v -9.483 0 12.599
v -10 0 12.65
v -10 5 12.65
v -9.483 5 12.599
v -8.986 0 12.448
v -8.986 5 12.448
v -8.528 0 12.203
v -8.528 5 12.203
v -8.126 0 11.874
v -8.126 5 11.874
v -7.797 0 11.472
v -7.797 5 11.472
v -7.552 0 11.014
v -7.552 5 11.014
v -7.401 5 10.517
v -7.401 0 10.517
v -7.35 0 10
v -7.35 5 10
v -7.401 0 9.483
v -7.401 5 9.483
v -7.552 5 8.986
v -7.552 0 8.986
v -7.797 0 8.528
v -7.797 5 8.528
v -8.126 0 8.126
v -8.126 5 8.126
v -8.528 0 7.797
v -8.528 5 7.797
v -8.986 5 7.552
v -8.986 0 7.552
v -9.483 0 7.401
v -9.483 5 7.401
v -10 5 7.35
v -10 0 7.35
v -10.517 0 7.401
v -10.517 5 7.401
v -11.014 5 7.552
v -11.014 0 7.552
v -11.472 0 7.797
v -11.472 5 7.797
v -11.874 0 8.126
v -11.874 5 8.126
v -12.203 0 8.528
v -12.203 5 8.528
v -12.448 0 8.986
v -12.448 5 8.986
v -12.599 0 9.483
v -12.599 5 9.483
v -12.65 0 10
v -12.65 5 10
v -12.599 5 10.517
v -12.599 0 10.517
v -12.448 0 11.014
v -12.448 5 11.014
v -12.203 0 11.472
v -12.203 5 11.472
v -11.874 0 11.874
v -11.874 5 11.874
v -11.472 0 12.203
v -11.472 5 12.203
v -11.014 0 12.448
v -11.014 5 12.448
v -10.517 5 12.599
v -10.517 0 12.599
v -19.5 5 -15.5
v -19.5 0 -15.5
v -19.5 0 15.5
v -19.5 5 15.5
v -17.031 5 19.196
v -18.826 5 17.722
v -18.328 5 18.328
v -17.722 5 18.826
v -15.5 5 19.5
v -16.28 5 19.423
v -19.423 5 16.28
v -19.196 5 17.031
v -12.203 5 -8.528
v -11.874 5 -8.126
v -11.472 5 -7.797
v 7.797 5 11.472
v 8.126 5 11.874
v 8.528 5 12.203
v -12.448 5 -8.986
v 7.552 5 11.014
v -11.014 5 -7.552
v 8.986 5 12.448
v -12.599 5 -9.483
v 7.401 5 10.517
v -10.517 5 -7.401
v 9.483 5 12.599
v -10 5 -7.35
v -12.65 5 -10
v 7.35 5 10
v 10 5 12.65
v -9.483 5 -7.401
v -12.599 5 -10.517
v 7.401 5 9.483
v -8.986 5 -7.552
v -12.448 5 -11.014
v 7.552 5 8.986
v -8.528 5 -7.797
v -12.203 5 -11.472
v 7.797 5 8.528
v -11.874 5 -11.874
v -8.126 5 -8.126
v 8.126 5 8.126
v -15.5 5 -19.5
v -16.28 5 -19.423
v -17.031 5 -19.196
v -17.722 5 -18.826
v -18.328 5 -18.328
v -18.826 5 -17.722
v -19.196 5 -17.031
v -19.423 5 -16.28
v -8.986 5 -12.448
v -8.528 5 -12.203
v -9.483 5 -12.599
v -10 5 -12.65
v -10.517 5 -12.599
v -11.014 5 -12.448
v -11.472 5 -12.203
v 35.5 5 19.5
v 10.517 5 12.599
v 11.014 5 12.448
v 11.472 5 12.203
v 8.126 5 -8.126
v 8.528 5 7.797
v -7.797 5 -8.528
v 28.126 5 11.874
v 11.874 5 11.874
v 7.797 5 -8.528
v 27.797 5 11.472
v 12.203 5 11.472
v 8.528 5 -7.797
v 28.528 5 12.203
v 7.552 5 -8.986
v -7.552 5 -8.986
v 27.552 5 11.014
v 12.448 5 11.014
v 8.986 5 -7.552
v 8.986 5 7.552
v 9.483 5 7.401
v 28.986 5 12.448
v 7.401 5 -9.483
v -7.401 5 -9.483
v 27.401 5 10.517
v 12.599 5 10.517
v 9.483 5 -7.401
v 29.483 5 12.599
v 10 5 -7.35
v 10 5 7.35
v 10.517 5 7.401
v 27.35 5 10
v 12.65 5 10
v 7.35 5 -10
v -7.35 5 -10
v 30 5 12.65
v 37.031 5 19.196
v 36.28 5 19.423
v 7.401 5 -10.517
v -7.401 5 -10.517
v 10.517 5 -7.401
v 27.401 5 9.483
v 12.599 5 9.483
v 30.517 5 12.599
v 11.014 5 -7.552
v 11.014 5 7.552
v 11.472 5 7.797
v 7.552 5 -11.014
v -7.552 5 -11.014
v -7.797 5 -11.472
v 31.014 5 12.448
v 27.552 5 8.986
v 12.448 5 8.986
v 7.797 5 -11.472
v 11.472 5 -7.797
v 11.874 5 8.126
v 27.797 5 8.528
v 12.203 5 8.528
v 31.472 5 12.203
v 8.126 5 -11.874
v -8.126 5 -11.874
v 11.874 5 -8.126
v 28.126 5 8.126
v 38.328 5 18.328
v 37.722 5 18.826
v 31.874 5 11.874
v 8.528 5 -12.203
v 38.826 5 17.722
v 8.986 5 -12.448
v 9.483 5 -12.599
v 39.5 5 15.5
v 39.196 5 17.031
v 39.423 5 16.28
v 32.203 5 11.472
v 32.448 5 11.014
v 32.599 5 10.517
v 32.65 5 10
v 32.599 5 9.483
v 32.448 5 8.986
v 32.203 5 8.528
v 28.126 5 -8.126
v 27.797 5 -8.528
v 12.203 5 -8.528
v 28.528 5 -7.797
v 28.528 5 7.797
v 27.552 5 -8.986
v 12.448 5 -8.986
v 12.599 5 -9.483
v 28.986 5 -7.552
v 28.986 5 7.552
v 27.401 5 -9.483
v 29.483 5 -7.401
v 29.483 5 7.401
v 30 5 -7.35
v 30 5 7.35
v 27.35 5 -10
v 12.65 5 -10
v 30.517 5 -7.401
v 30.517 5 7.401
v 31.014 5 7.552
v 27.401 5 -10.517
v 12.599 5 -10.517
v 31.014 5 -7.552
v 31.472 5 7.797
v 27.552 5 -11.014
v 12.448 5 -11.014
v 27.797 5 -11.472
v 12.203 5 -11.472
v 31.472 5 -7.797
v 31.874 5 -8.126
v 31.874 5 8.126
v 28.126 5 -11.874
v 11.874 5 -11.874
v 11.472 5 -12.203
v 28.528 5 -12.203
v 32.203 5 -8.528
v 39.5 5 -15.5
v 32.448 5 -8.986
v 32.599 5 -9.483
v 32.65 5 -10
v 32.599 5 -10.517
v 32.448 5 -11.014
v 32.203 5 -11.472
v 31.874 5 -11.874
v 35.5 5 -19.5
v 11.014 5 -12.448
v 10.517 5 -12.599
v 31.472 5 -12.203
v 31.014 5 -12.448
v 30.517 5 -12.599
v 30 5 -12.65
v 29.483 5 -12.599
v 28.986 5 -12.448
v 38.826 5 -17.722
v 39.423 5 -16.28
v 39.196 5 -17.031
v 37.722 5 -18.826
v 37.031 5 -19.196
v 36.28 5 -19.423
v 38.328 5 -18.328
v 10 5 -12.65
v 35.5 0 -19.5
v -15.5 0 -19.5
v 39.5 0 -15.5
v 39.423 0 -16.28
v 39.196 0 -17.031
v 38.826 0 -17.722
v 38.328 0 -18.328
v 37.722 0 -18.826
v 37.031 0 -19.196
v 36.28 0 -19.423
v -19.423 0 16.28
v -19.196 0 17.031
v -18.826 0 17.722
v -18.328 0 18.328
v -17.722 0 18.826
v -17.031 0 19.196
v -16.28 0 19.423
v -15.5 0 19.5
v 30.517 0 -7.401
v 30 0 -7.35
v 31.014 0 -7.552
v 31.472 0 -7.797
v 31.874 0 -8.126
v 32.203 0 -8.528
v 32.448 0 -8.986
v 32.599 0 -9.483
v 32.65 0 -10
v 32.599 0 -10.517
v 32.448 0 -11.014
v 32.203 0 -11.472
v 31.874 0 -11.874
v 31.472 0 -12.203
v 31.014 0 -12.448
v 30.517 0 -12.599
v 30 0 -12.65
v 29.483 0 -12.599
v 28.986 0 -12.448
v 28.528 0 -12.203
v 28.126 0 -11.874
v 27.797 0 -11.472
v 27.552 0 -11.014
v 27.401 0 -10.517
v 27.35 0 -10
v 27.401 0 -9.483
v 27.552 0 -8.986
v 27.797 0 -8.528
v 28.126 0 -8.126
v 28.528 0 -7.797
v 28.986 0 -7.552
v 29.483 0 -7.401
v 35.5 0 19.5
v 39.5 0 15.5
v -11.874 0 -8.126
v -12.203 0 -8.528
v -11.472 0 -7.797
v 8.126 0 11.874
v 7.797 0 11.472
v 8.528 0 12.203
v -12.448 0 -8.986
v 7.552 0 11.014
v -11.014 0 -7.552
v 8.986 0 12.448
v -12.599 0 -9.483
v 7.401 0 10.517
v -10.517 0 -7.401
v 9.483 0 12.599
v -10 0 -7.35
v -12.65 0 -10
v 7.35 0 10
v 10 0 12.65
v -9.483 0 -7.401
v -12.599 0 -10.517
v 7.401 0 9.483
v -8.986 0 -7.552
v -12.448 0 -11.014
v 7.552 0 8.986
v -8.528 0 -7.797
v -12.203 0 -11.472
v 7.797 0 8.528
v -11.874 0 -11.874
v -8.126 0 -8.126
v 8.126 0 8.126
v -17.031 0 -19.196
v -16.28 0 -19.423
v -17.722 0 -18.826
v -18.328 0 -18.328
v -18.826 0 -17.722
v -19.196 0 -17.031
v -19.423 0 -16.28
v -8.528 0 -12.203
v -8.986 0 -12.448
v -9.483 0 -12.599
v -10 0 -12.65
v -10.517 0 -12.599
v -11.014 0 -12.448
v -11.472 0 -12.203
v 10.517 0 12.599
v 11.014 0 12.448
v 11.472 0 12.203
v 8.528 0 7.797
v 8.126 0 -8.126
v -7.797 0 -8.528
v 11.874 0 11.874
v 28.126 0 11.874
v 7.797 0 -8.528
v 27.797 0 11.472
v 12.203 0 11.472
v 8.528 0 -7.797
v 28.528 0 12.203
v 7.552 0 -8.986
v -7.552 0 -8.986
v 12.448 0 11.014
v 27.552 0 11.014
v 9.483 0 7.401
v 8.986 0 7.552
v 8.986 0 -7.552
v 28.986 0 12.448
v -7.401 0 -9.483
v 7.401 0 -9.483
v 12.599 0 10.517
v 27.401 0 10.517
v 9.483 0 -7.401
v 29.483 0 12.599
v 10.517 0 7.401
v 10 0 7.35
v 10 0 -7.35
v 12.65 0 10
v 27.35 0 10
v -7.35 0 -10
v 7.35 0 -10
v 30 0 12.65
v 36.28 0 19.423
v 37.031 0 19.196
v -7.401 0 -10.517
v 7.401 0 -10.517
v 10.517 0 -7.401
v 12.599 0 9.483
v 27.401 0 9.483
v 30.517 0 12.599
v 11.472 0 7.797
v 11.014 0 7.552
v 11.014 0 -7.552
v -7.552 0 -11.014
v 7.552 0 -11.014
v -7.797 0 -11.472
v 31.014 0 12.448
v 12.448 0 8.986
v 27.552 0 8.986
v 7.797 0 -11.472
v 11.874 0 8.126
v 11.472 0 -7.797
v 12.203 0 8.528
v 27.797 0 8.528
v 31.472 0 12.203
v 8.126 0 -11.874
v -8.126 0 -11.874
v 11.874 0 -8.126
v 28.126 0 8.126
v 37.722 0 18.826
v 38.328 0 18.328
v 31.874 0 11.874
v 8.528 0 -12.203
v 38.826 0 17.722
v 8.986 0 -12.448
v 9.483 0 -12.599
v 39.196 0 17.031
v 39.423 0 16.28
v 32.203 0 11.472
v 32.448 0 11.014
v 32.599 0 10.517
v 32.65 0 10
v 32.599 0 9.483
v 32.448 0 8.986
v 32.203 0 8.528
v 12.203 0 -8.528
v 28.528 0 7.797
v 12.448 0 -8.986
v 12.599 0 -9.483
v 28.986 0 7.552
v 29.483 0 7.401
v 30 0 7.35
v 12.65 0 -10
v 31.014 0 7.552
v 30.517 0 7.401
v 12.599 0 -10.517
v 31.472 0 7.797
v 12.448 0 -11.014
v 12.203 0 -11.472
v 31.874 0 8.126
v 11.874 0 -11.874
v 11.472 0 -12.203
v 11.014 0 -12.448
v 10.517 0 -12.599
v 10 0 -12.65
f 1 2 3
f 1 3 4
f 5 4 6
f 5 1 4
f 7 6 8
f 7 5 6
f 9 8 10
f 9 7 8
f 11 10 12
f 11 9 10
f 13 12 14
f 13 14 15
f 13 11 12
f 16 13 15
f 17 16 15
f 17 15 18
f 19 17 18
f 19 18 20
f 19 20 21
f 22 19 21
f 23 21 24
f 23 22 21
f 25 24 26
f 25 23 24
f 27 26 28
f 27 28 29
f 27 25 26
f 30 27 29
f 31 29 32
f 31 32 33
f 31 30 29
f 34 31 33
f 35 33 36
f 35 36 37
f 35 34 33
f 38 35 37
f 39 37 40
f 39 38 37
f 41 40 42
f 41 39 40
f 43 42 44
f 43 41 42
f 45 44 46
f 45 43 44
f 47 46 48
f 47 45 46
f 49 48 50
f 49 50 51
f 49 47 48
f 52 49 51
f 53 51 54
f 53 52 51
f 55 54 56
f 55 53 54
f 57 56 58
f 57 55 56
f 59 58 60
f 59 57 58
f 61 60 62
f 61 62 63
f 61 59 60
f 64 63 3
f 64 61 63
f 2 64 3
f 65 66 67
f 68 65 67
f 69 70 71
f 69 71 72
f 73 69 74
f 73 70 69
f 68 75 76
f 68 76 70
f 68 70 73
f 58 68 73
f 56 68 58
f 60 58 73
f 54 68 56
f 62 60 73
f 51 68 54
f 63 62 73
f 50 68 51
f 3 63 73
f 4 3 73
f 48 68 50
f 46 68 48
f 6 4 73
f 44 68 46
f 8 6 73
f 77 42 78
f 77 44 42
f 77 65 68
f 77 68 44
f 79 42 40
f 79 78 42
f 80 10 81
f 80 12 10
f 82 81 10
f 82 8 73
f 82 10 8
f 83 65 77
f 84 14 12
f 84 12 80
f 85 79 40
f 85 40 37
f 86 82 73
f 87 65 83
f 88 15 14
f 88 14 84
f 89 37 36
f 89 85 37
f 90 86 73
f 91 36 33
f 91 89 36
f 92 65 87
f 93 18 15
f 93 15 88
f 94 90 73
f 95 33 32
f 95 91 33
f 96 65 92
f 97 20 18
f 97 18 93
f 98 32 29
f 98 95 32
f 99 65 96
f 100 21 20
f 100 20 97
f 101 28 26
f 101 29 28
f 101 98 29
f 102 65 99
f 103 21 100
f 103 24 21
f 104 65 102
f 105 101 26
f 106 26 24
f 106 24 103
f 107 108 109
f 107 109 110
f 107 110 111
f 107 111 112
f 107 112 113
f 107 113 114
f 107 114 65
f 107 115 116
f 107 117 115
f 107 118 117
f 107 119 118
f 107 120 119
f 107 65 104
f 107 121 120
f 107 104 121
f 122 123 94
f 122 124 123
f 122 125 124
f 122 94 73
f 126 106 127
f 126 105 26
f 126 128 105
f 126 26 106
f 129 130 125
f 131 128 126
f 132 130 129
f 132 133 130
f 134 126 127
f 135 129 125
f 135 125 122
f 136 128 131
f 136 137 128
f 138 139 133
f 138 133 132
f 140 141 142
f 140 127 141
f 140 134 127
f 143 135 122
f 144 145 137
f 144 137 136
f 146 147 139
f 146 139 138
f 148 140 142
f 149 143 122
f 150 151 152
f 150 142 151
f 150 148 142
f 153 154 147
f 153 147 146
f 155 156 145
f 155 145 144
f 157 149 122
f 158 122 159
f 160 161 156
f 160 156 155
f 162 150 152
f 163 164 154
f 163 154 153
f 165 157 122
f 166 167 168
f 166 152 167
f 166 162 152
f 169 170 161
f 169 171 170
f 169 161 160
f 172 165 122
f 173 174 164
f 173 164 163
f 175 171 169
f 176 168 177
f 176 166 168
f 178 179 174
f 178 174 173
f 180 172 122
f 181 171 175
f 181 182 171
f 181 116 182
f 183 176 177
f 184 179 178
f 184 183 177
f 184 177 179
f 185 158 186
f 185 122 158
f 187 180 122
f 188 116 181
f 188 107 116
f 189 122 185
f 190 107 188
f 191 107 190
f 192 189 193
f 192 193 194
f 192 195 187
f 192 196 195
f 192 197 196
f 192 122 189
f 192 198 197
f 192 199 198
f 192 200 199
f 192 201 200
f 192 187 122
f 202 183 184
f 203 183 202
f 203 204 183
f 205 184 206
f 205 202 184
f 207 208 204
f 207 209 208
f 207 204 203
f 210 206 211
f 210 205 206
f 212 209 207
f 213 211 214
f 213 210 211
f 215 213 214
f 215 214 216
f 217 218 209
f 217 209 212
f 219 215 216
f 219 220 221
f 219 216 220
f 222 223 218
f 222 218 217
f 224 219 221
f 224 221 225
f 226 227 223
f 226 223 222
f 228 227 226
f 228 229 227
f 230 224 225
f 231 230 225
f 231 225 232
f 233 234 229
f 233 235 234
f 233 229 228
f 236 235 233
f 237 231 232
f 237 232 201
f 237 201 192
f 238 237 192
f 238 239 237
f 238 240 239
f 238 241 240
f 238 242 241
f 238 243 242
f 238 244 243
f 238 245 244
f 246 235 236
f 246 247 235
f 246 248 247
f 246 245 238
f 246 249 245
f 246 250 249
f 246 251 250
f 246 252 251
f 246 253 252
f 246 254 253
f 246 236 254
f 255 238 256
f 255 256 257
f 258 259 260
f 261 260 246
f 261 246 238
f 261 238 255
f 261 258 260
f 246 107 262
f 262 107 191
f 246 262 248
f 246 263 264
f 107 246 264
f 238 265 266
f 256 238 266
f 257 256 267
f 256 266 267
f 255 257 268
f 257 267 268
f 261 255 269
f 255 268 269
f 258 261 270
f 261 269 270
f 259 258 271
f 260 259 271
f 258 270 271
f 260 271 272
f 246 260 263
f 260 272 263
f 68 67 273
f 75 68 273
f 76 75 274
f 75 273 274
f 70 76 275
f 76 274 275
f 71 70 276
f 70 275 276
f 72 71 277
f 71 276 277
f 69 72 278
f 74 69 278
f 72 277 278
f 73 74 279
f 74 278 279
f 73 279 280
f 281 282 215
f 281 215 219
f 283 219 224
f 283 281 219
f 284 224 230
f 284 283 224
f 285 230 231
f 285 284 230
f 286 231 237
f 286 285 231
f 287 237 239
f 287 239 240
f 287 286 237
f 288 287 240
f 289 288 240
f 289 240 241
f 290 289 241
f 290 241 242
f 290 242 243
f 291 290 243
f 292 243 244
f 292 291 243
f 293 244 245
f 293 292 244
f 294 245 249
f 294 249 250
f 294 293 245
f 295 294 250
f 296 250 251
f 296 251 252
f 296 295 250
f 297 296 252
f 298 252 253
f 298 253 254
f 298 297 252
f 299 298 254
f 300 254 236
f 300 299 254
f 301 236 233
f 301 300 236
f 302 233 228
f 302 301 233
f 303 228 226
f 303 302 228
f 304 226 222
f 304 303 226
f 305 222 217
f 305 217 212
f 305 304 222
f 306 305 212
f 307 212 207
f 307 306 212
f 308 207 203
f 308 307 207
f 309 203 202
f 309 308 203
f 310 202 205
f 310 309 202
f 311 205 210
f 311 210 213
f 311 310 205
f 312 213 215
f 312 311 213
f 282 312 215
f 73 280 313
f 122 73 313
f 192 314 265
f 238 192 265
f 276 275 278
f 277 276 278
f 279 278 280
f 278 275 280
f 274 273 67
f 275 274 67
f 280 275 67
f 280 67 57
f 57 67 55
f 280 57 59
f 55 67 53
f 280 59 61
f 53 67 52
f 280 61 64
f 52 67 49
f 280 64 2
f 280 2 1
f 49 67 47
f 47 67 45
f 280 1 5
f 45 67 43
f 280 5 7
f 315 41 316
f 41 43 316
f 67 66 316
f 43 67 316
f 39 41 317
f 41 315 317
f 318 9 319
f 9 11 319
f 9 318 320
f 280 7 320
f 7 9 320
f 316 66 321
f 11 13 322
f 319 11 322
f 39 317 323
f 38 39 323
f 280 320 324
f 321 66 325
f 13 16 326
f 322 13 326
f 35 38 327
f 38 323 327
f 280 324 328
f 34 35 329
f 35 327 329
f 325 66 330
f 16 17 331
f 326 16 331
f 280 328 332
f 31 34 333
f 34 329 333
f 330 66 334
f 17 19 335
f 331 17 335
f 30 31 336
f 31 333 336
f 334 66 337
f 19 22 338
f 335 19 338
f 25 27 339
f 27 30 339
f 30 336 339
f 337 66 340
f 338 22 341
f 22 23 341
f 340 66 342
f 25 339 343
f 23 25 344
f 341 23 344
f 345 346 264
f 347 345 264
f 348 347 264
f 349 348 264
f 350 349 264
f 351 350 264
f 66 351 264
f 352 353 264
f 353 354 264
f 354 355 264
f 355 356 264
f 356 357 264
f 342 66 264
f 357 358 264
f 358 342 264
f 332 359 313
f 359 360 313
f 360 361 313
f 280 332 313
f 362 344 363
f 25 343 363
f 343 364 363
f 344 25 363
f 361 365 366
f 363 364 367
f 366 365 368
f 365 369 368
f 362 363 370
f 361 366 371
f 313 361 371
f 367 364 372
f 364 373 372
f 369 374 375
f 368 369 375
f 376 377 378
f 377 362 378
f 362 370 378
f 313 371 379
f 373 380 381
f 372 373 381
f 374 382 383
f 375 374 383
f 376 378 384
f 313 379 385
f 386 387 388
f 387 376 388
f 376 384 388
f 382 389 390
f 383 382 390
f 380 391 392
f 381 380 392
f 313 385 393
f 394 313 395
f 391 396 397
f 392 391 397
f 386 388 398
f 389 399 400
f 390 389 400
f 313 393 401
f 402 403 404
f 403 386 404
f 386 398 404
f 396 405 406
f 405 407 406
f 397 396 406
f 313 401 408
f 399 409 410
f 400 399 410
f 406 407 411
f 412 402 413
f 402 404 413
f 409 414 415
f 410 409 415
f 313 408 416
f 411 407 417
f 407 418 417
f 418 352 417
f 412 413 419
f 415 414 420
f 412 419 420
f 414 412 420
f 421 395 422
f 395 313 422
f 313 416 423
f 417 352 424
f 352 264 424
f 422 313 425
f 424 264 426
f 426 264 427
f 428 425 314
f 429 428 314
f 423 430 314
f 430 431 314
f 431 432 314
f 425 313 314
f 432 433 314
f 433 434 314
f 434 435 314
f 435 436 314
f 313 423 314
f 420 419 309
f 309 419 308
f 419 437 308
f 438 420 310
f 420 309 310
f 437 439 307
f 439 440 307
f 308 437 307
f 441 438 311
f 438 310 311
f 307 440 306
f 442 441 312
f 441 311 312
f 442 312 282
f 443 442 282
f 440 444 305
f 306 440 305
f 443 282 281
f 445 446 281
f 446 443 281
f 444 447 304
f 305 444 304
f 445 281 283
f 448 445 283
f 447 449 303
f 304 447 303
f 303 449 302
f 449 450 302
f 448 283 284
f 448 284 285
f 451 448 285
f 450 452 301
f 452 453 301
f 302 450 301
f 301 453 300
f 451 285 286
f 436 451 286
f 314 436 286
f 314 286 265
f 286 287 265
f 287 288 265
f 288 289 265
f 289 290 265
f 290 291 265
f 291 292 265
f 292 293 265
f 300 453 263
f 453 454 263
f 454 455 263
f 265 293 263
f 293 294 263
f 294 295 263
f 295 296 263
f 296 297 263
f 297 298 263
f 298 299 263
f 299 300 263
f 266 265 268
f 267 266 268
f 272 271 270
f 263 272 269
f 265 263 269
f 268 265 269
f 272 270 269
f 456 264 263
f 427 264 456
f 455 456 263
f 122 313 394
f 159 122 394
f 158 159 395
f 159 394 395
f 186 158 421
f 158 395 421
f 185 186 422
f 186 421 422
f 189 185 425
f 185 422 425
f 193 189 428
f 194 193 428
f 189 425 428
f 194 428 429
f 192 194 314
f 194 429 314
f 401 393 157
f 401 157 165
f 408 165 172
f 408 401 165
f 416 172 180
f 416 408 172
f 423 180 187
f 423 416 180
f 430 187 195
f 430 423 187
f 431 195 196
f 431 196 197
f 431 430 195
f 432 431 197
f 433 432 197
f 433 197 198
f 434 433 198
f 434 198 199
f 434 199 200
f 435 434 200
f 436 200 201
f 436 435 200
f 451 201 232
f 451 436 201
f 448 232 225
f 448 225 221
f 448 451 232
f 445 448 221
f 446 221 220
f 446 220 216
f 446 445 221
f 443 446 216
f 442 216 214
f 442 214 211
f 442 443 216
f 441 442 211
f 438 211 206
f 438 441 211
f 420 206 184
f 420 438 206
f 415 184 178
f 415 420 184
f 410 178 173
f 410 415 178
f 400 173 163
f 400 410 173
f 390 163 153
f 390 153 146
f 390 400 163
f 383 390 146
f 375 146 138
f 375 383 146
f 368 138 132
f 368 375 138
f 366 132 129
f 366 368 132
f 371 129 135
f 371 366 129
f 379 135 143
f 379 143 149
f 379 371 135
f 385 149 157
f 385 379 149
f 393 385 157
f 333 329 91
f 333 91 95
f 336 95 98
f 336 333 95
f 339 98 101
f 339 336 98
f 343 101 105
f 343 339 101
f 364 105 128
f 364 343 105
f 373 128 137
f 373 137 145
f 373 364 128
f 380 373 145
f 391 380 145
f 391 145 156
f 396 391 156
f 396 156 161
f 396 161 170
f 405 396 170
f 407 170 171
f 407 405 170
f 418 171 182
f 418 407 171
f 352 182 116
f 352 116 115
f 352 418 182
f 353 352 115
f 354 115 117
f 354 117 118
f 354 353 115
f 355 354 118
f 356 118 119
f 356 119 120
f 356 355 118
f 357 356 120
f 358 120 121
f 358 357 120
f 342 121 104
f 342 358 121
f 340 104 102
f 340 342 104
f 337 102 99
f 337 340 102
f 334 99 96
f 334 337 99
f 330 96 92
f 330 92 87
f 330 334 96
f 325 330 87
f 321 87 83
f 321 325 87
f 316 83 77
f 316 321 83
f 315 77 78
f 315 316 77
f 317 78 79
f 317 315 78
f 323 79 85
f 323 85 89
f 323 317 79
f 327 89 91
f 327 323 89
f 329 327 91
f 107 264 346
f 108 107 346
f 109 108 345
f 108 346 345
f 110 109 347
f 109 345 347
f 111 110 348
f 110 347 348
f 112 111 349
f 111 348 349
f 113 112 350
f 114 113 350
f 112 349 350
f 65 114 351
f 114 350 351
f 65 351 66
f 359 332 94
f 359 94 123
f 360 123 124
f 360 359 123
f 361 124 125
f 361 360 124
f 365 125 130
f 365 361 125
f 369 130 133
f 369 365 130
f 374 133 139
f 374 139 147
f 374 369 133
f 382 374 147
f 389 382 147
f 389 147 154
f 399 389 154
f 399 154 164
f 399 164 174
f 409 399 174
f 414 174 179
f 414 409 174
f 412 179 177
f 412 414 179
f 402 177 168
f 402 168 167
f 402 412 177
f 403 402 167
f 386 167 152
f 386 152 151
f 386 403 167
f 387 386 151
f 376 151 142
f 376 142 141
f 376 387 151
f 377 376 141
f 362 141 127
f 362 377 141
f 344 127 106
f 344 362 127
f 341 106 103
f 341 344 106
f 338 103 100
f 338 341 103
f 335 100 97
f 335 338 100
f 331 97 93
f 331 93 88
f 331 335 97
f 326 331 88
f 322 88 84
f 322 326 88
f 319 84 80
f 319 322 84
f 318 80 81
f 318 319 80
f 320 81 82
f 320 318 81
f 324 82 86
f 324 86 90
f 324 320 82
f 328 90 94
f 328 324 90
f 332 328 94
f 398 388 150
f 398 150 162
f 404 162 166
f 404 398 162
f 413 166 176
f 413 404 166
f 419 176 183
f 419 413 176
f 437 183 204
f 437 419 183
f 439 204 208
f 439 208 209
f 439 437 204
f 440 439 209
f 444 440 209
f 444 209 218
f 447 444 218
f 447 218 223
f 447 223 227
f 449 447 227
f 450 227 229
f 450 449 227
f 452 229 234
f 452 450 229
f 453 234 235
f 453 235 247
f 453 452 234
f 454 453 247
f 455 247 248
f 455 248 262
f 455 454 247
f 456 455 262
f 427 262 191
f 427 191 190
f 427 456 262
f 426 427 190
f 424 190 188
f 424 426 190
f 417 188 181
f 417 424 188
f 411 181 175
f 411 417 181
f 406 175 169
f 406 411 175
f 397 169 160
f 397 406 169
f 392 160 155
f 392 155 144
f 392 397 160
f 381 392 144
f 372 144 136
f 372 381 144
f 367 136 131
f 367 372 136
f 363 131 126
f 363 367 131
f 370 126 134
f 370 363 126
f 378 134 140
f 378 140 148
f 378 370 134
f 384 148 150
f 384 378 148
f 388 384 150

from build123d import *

# Parameters (mm, degrees)
F_4_HOLE_PROFILE_SKETCH_R        = 2.65
F_4_HOLE_THICKNESS_EXTRUDE_DEPTH = 5
F_6_HOLE_EXTENSION_SKETCH_R      = 2.65
F_6_HOLE_EXTENSION_EXTRUDE_DEPTH = 5


with BuildPart() as part:
    # 4 Hole Profile Sketch → 4 Hole Thickness Extrude (new body)
    with BuildSketch(Plane(origin=(0, 0, 0), x_dir=(1, 0, 0), z_dir=(0, 1, 0))):
        with BuildLine():
            Line((-15.5, -19.5), (15.5, -19.5))
            ThreePointArc((15.5, -19.5), (18.328427125, -18.328427125), (19.5, -15.5))
            Line((19.5, -15.5), (19.5, 15.5))
            ThreePointArc((19.5, 15.5), (18.328427125, 18.328427125), (15.5, 19.5))
            Line((15.5, 19.5), (-15.5, 19.5))
            ThreePointArc((-15.5, 19.5), (-18.328427125, 18.328427125), (-19.5, 15.5))
            Line((-19.5, 15.5), (-19.5, -15.5))
            ThreePointArc((-19.5, -15.5), (-18.328427125, -18.328427125), (-15.5, -19.5))
        make_face()
        with Locations(Location((10, -10, 0), (0, 0, 270))):
            Circle(F_4_HOLE_PROFILE_SKETCH_R, mode=Mode.SUBTRACT)
        with Locations(Location((10, 10, 0), (0, 0, 270))):
            Circle(F_4_HOLE_PROFILE_SKETCH_R, mode=Mode.SUBTRACT)
        with Locations(Location((-10, -10, 0), (0, 0, 270))):
            Circle(F_4_HOLE_PROFILE_SKETCH_R, mode=Mode.SUBTRACT)
        with Locations(Location((-10, 10, 0), (0, 0, 270))):
            Circle(F_4_HOLE_PROFILE_SKETCH_R, mode=Mode.SUBTRACT)
    extrude(amount=F_4_HOLE_THICKNESS_EXTRUDE_DEPTH)

    # 6 Hole Extension Sketch → 6 Hole Extension Extrude (add)
    with BuildSketch(Plane(origin=(0, 0, 0), x_dir=(1, 0, 0), z_dir=(0, 1, 0))):
        with BuildLine():
            Line((39.5, -15.5), (39.5, 15.5))
            ThreePointArc((39.5, 15.5), (38.328427125, 18.328427125), (35.5, 19.5))
            Line((35.5, 19.5), (15.5, 19.5))
            ThreePointArc((15.5, 19.5), (18.328427125, 18.328427125), (19.5, 15.5))
            Line((19.5, 15.5), (19.5, -15.5))
            ThreePointArc((19.5, -15.5), (18.328427125, -18.328427125), (15.5, -19.5))
            Line((15.5, -19.5), (35.5, -19.5))
            ThreePointArc((35.5, -19.5), (38.328427125, -18.328427125), (39.5, -15.5))
        make_face()
        with Locations(Location((30, -10, 0), (0, 0, 270))):
            Circle(F_6_HOLE_EXTENSION_SKETCH_R, mode=Mode.SUBTRACT)
        with Locations(Location((30, 10, 0), (0, 0, 270))):
            Circle(F_6_HOLE_EXTENSION_SKETCH_R, mode=Mode.SUBTRACT)
    extrude(amount=F_6_HOLE_EXTENSION_EXTRUDE_DEPTH)


solid = part.part
